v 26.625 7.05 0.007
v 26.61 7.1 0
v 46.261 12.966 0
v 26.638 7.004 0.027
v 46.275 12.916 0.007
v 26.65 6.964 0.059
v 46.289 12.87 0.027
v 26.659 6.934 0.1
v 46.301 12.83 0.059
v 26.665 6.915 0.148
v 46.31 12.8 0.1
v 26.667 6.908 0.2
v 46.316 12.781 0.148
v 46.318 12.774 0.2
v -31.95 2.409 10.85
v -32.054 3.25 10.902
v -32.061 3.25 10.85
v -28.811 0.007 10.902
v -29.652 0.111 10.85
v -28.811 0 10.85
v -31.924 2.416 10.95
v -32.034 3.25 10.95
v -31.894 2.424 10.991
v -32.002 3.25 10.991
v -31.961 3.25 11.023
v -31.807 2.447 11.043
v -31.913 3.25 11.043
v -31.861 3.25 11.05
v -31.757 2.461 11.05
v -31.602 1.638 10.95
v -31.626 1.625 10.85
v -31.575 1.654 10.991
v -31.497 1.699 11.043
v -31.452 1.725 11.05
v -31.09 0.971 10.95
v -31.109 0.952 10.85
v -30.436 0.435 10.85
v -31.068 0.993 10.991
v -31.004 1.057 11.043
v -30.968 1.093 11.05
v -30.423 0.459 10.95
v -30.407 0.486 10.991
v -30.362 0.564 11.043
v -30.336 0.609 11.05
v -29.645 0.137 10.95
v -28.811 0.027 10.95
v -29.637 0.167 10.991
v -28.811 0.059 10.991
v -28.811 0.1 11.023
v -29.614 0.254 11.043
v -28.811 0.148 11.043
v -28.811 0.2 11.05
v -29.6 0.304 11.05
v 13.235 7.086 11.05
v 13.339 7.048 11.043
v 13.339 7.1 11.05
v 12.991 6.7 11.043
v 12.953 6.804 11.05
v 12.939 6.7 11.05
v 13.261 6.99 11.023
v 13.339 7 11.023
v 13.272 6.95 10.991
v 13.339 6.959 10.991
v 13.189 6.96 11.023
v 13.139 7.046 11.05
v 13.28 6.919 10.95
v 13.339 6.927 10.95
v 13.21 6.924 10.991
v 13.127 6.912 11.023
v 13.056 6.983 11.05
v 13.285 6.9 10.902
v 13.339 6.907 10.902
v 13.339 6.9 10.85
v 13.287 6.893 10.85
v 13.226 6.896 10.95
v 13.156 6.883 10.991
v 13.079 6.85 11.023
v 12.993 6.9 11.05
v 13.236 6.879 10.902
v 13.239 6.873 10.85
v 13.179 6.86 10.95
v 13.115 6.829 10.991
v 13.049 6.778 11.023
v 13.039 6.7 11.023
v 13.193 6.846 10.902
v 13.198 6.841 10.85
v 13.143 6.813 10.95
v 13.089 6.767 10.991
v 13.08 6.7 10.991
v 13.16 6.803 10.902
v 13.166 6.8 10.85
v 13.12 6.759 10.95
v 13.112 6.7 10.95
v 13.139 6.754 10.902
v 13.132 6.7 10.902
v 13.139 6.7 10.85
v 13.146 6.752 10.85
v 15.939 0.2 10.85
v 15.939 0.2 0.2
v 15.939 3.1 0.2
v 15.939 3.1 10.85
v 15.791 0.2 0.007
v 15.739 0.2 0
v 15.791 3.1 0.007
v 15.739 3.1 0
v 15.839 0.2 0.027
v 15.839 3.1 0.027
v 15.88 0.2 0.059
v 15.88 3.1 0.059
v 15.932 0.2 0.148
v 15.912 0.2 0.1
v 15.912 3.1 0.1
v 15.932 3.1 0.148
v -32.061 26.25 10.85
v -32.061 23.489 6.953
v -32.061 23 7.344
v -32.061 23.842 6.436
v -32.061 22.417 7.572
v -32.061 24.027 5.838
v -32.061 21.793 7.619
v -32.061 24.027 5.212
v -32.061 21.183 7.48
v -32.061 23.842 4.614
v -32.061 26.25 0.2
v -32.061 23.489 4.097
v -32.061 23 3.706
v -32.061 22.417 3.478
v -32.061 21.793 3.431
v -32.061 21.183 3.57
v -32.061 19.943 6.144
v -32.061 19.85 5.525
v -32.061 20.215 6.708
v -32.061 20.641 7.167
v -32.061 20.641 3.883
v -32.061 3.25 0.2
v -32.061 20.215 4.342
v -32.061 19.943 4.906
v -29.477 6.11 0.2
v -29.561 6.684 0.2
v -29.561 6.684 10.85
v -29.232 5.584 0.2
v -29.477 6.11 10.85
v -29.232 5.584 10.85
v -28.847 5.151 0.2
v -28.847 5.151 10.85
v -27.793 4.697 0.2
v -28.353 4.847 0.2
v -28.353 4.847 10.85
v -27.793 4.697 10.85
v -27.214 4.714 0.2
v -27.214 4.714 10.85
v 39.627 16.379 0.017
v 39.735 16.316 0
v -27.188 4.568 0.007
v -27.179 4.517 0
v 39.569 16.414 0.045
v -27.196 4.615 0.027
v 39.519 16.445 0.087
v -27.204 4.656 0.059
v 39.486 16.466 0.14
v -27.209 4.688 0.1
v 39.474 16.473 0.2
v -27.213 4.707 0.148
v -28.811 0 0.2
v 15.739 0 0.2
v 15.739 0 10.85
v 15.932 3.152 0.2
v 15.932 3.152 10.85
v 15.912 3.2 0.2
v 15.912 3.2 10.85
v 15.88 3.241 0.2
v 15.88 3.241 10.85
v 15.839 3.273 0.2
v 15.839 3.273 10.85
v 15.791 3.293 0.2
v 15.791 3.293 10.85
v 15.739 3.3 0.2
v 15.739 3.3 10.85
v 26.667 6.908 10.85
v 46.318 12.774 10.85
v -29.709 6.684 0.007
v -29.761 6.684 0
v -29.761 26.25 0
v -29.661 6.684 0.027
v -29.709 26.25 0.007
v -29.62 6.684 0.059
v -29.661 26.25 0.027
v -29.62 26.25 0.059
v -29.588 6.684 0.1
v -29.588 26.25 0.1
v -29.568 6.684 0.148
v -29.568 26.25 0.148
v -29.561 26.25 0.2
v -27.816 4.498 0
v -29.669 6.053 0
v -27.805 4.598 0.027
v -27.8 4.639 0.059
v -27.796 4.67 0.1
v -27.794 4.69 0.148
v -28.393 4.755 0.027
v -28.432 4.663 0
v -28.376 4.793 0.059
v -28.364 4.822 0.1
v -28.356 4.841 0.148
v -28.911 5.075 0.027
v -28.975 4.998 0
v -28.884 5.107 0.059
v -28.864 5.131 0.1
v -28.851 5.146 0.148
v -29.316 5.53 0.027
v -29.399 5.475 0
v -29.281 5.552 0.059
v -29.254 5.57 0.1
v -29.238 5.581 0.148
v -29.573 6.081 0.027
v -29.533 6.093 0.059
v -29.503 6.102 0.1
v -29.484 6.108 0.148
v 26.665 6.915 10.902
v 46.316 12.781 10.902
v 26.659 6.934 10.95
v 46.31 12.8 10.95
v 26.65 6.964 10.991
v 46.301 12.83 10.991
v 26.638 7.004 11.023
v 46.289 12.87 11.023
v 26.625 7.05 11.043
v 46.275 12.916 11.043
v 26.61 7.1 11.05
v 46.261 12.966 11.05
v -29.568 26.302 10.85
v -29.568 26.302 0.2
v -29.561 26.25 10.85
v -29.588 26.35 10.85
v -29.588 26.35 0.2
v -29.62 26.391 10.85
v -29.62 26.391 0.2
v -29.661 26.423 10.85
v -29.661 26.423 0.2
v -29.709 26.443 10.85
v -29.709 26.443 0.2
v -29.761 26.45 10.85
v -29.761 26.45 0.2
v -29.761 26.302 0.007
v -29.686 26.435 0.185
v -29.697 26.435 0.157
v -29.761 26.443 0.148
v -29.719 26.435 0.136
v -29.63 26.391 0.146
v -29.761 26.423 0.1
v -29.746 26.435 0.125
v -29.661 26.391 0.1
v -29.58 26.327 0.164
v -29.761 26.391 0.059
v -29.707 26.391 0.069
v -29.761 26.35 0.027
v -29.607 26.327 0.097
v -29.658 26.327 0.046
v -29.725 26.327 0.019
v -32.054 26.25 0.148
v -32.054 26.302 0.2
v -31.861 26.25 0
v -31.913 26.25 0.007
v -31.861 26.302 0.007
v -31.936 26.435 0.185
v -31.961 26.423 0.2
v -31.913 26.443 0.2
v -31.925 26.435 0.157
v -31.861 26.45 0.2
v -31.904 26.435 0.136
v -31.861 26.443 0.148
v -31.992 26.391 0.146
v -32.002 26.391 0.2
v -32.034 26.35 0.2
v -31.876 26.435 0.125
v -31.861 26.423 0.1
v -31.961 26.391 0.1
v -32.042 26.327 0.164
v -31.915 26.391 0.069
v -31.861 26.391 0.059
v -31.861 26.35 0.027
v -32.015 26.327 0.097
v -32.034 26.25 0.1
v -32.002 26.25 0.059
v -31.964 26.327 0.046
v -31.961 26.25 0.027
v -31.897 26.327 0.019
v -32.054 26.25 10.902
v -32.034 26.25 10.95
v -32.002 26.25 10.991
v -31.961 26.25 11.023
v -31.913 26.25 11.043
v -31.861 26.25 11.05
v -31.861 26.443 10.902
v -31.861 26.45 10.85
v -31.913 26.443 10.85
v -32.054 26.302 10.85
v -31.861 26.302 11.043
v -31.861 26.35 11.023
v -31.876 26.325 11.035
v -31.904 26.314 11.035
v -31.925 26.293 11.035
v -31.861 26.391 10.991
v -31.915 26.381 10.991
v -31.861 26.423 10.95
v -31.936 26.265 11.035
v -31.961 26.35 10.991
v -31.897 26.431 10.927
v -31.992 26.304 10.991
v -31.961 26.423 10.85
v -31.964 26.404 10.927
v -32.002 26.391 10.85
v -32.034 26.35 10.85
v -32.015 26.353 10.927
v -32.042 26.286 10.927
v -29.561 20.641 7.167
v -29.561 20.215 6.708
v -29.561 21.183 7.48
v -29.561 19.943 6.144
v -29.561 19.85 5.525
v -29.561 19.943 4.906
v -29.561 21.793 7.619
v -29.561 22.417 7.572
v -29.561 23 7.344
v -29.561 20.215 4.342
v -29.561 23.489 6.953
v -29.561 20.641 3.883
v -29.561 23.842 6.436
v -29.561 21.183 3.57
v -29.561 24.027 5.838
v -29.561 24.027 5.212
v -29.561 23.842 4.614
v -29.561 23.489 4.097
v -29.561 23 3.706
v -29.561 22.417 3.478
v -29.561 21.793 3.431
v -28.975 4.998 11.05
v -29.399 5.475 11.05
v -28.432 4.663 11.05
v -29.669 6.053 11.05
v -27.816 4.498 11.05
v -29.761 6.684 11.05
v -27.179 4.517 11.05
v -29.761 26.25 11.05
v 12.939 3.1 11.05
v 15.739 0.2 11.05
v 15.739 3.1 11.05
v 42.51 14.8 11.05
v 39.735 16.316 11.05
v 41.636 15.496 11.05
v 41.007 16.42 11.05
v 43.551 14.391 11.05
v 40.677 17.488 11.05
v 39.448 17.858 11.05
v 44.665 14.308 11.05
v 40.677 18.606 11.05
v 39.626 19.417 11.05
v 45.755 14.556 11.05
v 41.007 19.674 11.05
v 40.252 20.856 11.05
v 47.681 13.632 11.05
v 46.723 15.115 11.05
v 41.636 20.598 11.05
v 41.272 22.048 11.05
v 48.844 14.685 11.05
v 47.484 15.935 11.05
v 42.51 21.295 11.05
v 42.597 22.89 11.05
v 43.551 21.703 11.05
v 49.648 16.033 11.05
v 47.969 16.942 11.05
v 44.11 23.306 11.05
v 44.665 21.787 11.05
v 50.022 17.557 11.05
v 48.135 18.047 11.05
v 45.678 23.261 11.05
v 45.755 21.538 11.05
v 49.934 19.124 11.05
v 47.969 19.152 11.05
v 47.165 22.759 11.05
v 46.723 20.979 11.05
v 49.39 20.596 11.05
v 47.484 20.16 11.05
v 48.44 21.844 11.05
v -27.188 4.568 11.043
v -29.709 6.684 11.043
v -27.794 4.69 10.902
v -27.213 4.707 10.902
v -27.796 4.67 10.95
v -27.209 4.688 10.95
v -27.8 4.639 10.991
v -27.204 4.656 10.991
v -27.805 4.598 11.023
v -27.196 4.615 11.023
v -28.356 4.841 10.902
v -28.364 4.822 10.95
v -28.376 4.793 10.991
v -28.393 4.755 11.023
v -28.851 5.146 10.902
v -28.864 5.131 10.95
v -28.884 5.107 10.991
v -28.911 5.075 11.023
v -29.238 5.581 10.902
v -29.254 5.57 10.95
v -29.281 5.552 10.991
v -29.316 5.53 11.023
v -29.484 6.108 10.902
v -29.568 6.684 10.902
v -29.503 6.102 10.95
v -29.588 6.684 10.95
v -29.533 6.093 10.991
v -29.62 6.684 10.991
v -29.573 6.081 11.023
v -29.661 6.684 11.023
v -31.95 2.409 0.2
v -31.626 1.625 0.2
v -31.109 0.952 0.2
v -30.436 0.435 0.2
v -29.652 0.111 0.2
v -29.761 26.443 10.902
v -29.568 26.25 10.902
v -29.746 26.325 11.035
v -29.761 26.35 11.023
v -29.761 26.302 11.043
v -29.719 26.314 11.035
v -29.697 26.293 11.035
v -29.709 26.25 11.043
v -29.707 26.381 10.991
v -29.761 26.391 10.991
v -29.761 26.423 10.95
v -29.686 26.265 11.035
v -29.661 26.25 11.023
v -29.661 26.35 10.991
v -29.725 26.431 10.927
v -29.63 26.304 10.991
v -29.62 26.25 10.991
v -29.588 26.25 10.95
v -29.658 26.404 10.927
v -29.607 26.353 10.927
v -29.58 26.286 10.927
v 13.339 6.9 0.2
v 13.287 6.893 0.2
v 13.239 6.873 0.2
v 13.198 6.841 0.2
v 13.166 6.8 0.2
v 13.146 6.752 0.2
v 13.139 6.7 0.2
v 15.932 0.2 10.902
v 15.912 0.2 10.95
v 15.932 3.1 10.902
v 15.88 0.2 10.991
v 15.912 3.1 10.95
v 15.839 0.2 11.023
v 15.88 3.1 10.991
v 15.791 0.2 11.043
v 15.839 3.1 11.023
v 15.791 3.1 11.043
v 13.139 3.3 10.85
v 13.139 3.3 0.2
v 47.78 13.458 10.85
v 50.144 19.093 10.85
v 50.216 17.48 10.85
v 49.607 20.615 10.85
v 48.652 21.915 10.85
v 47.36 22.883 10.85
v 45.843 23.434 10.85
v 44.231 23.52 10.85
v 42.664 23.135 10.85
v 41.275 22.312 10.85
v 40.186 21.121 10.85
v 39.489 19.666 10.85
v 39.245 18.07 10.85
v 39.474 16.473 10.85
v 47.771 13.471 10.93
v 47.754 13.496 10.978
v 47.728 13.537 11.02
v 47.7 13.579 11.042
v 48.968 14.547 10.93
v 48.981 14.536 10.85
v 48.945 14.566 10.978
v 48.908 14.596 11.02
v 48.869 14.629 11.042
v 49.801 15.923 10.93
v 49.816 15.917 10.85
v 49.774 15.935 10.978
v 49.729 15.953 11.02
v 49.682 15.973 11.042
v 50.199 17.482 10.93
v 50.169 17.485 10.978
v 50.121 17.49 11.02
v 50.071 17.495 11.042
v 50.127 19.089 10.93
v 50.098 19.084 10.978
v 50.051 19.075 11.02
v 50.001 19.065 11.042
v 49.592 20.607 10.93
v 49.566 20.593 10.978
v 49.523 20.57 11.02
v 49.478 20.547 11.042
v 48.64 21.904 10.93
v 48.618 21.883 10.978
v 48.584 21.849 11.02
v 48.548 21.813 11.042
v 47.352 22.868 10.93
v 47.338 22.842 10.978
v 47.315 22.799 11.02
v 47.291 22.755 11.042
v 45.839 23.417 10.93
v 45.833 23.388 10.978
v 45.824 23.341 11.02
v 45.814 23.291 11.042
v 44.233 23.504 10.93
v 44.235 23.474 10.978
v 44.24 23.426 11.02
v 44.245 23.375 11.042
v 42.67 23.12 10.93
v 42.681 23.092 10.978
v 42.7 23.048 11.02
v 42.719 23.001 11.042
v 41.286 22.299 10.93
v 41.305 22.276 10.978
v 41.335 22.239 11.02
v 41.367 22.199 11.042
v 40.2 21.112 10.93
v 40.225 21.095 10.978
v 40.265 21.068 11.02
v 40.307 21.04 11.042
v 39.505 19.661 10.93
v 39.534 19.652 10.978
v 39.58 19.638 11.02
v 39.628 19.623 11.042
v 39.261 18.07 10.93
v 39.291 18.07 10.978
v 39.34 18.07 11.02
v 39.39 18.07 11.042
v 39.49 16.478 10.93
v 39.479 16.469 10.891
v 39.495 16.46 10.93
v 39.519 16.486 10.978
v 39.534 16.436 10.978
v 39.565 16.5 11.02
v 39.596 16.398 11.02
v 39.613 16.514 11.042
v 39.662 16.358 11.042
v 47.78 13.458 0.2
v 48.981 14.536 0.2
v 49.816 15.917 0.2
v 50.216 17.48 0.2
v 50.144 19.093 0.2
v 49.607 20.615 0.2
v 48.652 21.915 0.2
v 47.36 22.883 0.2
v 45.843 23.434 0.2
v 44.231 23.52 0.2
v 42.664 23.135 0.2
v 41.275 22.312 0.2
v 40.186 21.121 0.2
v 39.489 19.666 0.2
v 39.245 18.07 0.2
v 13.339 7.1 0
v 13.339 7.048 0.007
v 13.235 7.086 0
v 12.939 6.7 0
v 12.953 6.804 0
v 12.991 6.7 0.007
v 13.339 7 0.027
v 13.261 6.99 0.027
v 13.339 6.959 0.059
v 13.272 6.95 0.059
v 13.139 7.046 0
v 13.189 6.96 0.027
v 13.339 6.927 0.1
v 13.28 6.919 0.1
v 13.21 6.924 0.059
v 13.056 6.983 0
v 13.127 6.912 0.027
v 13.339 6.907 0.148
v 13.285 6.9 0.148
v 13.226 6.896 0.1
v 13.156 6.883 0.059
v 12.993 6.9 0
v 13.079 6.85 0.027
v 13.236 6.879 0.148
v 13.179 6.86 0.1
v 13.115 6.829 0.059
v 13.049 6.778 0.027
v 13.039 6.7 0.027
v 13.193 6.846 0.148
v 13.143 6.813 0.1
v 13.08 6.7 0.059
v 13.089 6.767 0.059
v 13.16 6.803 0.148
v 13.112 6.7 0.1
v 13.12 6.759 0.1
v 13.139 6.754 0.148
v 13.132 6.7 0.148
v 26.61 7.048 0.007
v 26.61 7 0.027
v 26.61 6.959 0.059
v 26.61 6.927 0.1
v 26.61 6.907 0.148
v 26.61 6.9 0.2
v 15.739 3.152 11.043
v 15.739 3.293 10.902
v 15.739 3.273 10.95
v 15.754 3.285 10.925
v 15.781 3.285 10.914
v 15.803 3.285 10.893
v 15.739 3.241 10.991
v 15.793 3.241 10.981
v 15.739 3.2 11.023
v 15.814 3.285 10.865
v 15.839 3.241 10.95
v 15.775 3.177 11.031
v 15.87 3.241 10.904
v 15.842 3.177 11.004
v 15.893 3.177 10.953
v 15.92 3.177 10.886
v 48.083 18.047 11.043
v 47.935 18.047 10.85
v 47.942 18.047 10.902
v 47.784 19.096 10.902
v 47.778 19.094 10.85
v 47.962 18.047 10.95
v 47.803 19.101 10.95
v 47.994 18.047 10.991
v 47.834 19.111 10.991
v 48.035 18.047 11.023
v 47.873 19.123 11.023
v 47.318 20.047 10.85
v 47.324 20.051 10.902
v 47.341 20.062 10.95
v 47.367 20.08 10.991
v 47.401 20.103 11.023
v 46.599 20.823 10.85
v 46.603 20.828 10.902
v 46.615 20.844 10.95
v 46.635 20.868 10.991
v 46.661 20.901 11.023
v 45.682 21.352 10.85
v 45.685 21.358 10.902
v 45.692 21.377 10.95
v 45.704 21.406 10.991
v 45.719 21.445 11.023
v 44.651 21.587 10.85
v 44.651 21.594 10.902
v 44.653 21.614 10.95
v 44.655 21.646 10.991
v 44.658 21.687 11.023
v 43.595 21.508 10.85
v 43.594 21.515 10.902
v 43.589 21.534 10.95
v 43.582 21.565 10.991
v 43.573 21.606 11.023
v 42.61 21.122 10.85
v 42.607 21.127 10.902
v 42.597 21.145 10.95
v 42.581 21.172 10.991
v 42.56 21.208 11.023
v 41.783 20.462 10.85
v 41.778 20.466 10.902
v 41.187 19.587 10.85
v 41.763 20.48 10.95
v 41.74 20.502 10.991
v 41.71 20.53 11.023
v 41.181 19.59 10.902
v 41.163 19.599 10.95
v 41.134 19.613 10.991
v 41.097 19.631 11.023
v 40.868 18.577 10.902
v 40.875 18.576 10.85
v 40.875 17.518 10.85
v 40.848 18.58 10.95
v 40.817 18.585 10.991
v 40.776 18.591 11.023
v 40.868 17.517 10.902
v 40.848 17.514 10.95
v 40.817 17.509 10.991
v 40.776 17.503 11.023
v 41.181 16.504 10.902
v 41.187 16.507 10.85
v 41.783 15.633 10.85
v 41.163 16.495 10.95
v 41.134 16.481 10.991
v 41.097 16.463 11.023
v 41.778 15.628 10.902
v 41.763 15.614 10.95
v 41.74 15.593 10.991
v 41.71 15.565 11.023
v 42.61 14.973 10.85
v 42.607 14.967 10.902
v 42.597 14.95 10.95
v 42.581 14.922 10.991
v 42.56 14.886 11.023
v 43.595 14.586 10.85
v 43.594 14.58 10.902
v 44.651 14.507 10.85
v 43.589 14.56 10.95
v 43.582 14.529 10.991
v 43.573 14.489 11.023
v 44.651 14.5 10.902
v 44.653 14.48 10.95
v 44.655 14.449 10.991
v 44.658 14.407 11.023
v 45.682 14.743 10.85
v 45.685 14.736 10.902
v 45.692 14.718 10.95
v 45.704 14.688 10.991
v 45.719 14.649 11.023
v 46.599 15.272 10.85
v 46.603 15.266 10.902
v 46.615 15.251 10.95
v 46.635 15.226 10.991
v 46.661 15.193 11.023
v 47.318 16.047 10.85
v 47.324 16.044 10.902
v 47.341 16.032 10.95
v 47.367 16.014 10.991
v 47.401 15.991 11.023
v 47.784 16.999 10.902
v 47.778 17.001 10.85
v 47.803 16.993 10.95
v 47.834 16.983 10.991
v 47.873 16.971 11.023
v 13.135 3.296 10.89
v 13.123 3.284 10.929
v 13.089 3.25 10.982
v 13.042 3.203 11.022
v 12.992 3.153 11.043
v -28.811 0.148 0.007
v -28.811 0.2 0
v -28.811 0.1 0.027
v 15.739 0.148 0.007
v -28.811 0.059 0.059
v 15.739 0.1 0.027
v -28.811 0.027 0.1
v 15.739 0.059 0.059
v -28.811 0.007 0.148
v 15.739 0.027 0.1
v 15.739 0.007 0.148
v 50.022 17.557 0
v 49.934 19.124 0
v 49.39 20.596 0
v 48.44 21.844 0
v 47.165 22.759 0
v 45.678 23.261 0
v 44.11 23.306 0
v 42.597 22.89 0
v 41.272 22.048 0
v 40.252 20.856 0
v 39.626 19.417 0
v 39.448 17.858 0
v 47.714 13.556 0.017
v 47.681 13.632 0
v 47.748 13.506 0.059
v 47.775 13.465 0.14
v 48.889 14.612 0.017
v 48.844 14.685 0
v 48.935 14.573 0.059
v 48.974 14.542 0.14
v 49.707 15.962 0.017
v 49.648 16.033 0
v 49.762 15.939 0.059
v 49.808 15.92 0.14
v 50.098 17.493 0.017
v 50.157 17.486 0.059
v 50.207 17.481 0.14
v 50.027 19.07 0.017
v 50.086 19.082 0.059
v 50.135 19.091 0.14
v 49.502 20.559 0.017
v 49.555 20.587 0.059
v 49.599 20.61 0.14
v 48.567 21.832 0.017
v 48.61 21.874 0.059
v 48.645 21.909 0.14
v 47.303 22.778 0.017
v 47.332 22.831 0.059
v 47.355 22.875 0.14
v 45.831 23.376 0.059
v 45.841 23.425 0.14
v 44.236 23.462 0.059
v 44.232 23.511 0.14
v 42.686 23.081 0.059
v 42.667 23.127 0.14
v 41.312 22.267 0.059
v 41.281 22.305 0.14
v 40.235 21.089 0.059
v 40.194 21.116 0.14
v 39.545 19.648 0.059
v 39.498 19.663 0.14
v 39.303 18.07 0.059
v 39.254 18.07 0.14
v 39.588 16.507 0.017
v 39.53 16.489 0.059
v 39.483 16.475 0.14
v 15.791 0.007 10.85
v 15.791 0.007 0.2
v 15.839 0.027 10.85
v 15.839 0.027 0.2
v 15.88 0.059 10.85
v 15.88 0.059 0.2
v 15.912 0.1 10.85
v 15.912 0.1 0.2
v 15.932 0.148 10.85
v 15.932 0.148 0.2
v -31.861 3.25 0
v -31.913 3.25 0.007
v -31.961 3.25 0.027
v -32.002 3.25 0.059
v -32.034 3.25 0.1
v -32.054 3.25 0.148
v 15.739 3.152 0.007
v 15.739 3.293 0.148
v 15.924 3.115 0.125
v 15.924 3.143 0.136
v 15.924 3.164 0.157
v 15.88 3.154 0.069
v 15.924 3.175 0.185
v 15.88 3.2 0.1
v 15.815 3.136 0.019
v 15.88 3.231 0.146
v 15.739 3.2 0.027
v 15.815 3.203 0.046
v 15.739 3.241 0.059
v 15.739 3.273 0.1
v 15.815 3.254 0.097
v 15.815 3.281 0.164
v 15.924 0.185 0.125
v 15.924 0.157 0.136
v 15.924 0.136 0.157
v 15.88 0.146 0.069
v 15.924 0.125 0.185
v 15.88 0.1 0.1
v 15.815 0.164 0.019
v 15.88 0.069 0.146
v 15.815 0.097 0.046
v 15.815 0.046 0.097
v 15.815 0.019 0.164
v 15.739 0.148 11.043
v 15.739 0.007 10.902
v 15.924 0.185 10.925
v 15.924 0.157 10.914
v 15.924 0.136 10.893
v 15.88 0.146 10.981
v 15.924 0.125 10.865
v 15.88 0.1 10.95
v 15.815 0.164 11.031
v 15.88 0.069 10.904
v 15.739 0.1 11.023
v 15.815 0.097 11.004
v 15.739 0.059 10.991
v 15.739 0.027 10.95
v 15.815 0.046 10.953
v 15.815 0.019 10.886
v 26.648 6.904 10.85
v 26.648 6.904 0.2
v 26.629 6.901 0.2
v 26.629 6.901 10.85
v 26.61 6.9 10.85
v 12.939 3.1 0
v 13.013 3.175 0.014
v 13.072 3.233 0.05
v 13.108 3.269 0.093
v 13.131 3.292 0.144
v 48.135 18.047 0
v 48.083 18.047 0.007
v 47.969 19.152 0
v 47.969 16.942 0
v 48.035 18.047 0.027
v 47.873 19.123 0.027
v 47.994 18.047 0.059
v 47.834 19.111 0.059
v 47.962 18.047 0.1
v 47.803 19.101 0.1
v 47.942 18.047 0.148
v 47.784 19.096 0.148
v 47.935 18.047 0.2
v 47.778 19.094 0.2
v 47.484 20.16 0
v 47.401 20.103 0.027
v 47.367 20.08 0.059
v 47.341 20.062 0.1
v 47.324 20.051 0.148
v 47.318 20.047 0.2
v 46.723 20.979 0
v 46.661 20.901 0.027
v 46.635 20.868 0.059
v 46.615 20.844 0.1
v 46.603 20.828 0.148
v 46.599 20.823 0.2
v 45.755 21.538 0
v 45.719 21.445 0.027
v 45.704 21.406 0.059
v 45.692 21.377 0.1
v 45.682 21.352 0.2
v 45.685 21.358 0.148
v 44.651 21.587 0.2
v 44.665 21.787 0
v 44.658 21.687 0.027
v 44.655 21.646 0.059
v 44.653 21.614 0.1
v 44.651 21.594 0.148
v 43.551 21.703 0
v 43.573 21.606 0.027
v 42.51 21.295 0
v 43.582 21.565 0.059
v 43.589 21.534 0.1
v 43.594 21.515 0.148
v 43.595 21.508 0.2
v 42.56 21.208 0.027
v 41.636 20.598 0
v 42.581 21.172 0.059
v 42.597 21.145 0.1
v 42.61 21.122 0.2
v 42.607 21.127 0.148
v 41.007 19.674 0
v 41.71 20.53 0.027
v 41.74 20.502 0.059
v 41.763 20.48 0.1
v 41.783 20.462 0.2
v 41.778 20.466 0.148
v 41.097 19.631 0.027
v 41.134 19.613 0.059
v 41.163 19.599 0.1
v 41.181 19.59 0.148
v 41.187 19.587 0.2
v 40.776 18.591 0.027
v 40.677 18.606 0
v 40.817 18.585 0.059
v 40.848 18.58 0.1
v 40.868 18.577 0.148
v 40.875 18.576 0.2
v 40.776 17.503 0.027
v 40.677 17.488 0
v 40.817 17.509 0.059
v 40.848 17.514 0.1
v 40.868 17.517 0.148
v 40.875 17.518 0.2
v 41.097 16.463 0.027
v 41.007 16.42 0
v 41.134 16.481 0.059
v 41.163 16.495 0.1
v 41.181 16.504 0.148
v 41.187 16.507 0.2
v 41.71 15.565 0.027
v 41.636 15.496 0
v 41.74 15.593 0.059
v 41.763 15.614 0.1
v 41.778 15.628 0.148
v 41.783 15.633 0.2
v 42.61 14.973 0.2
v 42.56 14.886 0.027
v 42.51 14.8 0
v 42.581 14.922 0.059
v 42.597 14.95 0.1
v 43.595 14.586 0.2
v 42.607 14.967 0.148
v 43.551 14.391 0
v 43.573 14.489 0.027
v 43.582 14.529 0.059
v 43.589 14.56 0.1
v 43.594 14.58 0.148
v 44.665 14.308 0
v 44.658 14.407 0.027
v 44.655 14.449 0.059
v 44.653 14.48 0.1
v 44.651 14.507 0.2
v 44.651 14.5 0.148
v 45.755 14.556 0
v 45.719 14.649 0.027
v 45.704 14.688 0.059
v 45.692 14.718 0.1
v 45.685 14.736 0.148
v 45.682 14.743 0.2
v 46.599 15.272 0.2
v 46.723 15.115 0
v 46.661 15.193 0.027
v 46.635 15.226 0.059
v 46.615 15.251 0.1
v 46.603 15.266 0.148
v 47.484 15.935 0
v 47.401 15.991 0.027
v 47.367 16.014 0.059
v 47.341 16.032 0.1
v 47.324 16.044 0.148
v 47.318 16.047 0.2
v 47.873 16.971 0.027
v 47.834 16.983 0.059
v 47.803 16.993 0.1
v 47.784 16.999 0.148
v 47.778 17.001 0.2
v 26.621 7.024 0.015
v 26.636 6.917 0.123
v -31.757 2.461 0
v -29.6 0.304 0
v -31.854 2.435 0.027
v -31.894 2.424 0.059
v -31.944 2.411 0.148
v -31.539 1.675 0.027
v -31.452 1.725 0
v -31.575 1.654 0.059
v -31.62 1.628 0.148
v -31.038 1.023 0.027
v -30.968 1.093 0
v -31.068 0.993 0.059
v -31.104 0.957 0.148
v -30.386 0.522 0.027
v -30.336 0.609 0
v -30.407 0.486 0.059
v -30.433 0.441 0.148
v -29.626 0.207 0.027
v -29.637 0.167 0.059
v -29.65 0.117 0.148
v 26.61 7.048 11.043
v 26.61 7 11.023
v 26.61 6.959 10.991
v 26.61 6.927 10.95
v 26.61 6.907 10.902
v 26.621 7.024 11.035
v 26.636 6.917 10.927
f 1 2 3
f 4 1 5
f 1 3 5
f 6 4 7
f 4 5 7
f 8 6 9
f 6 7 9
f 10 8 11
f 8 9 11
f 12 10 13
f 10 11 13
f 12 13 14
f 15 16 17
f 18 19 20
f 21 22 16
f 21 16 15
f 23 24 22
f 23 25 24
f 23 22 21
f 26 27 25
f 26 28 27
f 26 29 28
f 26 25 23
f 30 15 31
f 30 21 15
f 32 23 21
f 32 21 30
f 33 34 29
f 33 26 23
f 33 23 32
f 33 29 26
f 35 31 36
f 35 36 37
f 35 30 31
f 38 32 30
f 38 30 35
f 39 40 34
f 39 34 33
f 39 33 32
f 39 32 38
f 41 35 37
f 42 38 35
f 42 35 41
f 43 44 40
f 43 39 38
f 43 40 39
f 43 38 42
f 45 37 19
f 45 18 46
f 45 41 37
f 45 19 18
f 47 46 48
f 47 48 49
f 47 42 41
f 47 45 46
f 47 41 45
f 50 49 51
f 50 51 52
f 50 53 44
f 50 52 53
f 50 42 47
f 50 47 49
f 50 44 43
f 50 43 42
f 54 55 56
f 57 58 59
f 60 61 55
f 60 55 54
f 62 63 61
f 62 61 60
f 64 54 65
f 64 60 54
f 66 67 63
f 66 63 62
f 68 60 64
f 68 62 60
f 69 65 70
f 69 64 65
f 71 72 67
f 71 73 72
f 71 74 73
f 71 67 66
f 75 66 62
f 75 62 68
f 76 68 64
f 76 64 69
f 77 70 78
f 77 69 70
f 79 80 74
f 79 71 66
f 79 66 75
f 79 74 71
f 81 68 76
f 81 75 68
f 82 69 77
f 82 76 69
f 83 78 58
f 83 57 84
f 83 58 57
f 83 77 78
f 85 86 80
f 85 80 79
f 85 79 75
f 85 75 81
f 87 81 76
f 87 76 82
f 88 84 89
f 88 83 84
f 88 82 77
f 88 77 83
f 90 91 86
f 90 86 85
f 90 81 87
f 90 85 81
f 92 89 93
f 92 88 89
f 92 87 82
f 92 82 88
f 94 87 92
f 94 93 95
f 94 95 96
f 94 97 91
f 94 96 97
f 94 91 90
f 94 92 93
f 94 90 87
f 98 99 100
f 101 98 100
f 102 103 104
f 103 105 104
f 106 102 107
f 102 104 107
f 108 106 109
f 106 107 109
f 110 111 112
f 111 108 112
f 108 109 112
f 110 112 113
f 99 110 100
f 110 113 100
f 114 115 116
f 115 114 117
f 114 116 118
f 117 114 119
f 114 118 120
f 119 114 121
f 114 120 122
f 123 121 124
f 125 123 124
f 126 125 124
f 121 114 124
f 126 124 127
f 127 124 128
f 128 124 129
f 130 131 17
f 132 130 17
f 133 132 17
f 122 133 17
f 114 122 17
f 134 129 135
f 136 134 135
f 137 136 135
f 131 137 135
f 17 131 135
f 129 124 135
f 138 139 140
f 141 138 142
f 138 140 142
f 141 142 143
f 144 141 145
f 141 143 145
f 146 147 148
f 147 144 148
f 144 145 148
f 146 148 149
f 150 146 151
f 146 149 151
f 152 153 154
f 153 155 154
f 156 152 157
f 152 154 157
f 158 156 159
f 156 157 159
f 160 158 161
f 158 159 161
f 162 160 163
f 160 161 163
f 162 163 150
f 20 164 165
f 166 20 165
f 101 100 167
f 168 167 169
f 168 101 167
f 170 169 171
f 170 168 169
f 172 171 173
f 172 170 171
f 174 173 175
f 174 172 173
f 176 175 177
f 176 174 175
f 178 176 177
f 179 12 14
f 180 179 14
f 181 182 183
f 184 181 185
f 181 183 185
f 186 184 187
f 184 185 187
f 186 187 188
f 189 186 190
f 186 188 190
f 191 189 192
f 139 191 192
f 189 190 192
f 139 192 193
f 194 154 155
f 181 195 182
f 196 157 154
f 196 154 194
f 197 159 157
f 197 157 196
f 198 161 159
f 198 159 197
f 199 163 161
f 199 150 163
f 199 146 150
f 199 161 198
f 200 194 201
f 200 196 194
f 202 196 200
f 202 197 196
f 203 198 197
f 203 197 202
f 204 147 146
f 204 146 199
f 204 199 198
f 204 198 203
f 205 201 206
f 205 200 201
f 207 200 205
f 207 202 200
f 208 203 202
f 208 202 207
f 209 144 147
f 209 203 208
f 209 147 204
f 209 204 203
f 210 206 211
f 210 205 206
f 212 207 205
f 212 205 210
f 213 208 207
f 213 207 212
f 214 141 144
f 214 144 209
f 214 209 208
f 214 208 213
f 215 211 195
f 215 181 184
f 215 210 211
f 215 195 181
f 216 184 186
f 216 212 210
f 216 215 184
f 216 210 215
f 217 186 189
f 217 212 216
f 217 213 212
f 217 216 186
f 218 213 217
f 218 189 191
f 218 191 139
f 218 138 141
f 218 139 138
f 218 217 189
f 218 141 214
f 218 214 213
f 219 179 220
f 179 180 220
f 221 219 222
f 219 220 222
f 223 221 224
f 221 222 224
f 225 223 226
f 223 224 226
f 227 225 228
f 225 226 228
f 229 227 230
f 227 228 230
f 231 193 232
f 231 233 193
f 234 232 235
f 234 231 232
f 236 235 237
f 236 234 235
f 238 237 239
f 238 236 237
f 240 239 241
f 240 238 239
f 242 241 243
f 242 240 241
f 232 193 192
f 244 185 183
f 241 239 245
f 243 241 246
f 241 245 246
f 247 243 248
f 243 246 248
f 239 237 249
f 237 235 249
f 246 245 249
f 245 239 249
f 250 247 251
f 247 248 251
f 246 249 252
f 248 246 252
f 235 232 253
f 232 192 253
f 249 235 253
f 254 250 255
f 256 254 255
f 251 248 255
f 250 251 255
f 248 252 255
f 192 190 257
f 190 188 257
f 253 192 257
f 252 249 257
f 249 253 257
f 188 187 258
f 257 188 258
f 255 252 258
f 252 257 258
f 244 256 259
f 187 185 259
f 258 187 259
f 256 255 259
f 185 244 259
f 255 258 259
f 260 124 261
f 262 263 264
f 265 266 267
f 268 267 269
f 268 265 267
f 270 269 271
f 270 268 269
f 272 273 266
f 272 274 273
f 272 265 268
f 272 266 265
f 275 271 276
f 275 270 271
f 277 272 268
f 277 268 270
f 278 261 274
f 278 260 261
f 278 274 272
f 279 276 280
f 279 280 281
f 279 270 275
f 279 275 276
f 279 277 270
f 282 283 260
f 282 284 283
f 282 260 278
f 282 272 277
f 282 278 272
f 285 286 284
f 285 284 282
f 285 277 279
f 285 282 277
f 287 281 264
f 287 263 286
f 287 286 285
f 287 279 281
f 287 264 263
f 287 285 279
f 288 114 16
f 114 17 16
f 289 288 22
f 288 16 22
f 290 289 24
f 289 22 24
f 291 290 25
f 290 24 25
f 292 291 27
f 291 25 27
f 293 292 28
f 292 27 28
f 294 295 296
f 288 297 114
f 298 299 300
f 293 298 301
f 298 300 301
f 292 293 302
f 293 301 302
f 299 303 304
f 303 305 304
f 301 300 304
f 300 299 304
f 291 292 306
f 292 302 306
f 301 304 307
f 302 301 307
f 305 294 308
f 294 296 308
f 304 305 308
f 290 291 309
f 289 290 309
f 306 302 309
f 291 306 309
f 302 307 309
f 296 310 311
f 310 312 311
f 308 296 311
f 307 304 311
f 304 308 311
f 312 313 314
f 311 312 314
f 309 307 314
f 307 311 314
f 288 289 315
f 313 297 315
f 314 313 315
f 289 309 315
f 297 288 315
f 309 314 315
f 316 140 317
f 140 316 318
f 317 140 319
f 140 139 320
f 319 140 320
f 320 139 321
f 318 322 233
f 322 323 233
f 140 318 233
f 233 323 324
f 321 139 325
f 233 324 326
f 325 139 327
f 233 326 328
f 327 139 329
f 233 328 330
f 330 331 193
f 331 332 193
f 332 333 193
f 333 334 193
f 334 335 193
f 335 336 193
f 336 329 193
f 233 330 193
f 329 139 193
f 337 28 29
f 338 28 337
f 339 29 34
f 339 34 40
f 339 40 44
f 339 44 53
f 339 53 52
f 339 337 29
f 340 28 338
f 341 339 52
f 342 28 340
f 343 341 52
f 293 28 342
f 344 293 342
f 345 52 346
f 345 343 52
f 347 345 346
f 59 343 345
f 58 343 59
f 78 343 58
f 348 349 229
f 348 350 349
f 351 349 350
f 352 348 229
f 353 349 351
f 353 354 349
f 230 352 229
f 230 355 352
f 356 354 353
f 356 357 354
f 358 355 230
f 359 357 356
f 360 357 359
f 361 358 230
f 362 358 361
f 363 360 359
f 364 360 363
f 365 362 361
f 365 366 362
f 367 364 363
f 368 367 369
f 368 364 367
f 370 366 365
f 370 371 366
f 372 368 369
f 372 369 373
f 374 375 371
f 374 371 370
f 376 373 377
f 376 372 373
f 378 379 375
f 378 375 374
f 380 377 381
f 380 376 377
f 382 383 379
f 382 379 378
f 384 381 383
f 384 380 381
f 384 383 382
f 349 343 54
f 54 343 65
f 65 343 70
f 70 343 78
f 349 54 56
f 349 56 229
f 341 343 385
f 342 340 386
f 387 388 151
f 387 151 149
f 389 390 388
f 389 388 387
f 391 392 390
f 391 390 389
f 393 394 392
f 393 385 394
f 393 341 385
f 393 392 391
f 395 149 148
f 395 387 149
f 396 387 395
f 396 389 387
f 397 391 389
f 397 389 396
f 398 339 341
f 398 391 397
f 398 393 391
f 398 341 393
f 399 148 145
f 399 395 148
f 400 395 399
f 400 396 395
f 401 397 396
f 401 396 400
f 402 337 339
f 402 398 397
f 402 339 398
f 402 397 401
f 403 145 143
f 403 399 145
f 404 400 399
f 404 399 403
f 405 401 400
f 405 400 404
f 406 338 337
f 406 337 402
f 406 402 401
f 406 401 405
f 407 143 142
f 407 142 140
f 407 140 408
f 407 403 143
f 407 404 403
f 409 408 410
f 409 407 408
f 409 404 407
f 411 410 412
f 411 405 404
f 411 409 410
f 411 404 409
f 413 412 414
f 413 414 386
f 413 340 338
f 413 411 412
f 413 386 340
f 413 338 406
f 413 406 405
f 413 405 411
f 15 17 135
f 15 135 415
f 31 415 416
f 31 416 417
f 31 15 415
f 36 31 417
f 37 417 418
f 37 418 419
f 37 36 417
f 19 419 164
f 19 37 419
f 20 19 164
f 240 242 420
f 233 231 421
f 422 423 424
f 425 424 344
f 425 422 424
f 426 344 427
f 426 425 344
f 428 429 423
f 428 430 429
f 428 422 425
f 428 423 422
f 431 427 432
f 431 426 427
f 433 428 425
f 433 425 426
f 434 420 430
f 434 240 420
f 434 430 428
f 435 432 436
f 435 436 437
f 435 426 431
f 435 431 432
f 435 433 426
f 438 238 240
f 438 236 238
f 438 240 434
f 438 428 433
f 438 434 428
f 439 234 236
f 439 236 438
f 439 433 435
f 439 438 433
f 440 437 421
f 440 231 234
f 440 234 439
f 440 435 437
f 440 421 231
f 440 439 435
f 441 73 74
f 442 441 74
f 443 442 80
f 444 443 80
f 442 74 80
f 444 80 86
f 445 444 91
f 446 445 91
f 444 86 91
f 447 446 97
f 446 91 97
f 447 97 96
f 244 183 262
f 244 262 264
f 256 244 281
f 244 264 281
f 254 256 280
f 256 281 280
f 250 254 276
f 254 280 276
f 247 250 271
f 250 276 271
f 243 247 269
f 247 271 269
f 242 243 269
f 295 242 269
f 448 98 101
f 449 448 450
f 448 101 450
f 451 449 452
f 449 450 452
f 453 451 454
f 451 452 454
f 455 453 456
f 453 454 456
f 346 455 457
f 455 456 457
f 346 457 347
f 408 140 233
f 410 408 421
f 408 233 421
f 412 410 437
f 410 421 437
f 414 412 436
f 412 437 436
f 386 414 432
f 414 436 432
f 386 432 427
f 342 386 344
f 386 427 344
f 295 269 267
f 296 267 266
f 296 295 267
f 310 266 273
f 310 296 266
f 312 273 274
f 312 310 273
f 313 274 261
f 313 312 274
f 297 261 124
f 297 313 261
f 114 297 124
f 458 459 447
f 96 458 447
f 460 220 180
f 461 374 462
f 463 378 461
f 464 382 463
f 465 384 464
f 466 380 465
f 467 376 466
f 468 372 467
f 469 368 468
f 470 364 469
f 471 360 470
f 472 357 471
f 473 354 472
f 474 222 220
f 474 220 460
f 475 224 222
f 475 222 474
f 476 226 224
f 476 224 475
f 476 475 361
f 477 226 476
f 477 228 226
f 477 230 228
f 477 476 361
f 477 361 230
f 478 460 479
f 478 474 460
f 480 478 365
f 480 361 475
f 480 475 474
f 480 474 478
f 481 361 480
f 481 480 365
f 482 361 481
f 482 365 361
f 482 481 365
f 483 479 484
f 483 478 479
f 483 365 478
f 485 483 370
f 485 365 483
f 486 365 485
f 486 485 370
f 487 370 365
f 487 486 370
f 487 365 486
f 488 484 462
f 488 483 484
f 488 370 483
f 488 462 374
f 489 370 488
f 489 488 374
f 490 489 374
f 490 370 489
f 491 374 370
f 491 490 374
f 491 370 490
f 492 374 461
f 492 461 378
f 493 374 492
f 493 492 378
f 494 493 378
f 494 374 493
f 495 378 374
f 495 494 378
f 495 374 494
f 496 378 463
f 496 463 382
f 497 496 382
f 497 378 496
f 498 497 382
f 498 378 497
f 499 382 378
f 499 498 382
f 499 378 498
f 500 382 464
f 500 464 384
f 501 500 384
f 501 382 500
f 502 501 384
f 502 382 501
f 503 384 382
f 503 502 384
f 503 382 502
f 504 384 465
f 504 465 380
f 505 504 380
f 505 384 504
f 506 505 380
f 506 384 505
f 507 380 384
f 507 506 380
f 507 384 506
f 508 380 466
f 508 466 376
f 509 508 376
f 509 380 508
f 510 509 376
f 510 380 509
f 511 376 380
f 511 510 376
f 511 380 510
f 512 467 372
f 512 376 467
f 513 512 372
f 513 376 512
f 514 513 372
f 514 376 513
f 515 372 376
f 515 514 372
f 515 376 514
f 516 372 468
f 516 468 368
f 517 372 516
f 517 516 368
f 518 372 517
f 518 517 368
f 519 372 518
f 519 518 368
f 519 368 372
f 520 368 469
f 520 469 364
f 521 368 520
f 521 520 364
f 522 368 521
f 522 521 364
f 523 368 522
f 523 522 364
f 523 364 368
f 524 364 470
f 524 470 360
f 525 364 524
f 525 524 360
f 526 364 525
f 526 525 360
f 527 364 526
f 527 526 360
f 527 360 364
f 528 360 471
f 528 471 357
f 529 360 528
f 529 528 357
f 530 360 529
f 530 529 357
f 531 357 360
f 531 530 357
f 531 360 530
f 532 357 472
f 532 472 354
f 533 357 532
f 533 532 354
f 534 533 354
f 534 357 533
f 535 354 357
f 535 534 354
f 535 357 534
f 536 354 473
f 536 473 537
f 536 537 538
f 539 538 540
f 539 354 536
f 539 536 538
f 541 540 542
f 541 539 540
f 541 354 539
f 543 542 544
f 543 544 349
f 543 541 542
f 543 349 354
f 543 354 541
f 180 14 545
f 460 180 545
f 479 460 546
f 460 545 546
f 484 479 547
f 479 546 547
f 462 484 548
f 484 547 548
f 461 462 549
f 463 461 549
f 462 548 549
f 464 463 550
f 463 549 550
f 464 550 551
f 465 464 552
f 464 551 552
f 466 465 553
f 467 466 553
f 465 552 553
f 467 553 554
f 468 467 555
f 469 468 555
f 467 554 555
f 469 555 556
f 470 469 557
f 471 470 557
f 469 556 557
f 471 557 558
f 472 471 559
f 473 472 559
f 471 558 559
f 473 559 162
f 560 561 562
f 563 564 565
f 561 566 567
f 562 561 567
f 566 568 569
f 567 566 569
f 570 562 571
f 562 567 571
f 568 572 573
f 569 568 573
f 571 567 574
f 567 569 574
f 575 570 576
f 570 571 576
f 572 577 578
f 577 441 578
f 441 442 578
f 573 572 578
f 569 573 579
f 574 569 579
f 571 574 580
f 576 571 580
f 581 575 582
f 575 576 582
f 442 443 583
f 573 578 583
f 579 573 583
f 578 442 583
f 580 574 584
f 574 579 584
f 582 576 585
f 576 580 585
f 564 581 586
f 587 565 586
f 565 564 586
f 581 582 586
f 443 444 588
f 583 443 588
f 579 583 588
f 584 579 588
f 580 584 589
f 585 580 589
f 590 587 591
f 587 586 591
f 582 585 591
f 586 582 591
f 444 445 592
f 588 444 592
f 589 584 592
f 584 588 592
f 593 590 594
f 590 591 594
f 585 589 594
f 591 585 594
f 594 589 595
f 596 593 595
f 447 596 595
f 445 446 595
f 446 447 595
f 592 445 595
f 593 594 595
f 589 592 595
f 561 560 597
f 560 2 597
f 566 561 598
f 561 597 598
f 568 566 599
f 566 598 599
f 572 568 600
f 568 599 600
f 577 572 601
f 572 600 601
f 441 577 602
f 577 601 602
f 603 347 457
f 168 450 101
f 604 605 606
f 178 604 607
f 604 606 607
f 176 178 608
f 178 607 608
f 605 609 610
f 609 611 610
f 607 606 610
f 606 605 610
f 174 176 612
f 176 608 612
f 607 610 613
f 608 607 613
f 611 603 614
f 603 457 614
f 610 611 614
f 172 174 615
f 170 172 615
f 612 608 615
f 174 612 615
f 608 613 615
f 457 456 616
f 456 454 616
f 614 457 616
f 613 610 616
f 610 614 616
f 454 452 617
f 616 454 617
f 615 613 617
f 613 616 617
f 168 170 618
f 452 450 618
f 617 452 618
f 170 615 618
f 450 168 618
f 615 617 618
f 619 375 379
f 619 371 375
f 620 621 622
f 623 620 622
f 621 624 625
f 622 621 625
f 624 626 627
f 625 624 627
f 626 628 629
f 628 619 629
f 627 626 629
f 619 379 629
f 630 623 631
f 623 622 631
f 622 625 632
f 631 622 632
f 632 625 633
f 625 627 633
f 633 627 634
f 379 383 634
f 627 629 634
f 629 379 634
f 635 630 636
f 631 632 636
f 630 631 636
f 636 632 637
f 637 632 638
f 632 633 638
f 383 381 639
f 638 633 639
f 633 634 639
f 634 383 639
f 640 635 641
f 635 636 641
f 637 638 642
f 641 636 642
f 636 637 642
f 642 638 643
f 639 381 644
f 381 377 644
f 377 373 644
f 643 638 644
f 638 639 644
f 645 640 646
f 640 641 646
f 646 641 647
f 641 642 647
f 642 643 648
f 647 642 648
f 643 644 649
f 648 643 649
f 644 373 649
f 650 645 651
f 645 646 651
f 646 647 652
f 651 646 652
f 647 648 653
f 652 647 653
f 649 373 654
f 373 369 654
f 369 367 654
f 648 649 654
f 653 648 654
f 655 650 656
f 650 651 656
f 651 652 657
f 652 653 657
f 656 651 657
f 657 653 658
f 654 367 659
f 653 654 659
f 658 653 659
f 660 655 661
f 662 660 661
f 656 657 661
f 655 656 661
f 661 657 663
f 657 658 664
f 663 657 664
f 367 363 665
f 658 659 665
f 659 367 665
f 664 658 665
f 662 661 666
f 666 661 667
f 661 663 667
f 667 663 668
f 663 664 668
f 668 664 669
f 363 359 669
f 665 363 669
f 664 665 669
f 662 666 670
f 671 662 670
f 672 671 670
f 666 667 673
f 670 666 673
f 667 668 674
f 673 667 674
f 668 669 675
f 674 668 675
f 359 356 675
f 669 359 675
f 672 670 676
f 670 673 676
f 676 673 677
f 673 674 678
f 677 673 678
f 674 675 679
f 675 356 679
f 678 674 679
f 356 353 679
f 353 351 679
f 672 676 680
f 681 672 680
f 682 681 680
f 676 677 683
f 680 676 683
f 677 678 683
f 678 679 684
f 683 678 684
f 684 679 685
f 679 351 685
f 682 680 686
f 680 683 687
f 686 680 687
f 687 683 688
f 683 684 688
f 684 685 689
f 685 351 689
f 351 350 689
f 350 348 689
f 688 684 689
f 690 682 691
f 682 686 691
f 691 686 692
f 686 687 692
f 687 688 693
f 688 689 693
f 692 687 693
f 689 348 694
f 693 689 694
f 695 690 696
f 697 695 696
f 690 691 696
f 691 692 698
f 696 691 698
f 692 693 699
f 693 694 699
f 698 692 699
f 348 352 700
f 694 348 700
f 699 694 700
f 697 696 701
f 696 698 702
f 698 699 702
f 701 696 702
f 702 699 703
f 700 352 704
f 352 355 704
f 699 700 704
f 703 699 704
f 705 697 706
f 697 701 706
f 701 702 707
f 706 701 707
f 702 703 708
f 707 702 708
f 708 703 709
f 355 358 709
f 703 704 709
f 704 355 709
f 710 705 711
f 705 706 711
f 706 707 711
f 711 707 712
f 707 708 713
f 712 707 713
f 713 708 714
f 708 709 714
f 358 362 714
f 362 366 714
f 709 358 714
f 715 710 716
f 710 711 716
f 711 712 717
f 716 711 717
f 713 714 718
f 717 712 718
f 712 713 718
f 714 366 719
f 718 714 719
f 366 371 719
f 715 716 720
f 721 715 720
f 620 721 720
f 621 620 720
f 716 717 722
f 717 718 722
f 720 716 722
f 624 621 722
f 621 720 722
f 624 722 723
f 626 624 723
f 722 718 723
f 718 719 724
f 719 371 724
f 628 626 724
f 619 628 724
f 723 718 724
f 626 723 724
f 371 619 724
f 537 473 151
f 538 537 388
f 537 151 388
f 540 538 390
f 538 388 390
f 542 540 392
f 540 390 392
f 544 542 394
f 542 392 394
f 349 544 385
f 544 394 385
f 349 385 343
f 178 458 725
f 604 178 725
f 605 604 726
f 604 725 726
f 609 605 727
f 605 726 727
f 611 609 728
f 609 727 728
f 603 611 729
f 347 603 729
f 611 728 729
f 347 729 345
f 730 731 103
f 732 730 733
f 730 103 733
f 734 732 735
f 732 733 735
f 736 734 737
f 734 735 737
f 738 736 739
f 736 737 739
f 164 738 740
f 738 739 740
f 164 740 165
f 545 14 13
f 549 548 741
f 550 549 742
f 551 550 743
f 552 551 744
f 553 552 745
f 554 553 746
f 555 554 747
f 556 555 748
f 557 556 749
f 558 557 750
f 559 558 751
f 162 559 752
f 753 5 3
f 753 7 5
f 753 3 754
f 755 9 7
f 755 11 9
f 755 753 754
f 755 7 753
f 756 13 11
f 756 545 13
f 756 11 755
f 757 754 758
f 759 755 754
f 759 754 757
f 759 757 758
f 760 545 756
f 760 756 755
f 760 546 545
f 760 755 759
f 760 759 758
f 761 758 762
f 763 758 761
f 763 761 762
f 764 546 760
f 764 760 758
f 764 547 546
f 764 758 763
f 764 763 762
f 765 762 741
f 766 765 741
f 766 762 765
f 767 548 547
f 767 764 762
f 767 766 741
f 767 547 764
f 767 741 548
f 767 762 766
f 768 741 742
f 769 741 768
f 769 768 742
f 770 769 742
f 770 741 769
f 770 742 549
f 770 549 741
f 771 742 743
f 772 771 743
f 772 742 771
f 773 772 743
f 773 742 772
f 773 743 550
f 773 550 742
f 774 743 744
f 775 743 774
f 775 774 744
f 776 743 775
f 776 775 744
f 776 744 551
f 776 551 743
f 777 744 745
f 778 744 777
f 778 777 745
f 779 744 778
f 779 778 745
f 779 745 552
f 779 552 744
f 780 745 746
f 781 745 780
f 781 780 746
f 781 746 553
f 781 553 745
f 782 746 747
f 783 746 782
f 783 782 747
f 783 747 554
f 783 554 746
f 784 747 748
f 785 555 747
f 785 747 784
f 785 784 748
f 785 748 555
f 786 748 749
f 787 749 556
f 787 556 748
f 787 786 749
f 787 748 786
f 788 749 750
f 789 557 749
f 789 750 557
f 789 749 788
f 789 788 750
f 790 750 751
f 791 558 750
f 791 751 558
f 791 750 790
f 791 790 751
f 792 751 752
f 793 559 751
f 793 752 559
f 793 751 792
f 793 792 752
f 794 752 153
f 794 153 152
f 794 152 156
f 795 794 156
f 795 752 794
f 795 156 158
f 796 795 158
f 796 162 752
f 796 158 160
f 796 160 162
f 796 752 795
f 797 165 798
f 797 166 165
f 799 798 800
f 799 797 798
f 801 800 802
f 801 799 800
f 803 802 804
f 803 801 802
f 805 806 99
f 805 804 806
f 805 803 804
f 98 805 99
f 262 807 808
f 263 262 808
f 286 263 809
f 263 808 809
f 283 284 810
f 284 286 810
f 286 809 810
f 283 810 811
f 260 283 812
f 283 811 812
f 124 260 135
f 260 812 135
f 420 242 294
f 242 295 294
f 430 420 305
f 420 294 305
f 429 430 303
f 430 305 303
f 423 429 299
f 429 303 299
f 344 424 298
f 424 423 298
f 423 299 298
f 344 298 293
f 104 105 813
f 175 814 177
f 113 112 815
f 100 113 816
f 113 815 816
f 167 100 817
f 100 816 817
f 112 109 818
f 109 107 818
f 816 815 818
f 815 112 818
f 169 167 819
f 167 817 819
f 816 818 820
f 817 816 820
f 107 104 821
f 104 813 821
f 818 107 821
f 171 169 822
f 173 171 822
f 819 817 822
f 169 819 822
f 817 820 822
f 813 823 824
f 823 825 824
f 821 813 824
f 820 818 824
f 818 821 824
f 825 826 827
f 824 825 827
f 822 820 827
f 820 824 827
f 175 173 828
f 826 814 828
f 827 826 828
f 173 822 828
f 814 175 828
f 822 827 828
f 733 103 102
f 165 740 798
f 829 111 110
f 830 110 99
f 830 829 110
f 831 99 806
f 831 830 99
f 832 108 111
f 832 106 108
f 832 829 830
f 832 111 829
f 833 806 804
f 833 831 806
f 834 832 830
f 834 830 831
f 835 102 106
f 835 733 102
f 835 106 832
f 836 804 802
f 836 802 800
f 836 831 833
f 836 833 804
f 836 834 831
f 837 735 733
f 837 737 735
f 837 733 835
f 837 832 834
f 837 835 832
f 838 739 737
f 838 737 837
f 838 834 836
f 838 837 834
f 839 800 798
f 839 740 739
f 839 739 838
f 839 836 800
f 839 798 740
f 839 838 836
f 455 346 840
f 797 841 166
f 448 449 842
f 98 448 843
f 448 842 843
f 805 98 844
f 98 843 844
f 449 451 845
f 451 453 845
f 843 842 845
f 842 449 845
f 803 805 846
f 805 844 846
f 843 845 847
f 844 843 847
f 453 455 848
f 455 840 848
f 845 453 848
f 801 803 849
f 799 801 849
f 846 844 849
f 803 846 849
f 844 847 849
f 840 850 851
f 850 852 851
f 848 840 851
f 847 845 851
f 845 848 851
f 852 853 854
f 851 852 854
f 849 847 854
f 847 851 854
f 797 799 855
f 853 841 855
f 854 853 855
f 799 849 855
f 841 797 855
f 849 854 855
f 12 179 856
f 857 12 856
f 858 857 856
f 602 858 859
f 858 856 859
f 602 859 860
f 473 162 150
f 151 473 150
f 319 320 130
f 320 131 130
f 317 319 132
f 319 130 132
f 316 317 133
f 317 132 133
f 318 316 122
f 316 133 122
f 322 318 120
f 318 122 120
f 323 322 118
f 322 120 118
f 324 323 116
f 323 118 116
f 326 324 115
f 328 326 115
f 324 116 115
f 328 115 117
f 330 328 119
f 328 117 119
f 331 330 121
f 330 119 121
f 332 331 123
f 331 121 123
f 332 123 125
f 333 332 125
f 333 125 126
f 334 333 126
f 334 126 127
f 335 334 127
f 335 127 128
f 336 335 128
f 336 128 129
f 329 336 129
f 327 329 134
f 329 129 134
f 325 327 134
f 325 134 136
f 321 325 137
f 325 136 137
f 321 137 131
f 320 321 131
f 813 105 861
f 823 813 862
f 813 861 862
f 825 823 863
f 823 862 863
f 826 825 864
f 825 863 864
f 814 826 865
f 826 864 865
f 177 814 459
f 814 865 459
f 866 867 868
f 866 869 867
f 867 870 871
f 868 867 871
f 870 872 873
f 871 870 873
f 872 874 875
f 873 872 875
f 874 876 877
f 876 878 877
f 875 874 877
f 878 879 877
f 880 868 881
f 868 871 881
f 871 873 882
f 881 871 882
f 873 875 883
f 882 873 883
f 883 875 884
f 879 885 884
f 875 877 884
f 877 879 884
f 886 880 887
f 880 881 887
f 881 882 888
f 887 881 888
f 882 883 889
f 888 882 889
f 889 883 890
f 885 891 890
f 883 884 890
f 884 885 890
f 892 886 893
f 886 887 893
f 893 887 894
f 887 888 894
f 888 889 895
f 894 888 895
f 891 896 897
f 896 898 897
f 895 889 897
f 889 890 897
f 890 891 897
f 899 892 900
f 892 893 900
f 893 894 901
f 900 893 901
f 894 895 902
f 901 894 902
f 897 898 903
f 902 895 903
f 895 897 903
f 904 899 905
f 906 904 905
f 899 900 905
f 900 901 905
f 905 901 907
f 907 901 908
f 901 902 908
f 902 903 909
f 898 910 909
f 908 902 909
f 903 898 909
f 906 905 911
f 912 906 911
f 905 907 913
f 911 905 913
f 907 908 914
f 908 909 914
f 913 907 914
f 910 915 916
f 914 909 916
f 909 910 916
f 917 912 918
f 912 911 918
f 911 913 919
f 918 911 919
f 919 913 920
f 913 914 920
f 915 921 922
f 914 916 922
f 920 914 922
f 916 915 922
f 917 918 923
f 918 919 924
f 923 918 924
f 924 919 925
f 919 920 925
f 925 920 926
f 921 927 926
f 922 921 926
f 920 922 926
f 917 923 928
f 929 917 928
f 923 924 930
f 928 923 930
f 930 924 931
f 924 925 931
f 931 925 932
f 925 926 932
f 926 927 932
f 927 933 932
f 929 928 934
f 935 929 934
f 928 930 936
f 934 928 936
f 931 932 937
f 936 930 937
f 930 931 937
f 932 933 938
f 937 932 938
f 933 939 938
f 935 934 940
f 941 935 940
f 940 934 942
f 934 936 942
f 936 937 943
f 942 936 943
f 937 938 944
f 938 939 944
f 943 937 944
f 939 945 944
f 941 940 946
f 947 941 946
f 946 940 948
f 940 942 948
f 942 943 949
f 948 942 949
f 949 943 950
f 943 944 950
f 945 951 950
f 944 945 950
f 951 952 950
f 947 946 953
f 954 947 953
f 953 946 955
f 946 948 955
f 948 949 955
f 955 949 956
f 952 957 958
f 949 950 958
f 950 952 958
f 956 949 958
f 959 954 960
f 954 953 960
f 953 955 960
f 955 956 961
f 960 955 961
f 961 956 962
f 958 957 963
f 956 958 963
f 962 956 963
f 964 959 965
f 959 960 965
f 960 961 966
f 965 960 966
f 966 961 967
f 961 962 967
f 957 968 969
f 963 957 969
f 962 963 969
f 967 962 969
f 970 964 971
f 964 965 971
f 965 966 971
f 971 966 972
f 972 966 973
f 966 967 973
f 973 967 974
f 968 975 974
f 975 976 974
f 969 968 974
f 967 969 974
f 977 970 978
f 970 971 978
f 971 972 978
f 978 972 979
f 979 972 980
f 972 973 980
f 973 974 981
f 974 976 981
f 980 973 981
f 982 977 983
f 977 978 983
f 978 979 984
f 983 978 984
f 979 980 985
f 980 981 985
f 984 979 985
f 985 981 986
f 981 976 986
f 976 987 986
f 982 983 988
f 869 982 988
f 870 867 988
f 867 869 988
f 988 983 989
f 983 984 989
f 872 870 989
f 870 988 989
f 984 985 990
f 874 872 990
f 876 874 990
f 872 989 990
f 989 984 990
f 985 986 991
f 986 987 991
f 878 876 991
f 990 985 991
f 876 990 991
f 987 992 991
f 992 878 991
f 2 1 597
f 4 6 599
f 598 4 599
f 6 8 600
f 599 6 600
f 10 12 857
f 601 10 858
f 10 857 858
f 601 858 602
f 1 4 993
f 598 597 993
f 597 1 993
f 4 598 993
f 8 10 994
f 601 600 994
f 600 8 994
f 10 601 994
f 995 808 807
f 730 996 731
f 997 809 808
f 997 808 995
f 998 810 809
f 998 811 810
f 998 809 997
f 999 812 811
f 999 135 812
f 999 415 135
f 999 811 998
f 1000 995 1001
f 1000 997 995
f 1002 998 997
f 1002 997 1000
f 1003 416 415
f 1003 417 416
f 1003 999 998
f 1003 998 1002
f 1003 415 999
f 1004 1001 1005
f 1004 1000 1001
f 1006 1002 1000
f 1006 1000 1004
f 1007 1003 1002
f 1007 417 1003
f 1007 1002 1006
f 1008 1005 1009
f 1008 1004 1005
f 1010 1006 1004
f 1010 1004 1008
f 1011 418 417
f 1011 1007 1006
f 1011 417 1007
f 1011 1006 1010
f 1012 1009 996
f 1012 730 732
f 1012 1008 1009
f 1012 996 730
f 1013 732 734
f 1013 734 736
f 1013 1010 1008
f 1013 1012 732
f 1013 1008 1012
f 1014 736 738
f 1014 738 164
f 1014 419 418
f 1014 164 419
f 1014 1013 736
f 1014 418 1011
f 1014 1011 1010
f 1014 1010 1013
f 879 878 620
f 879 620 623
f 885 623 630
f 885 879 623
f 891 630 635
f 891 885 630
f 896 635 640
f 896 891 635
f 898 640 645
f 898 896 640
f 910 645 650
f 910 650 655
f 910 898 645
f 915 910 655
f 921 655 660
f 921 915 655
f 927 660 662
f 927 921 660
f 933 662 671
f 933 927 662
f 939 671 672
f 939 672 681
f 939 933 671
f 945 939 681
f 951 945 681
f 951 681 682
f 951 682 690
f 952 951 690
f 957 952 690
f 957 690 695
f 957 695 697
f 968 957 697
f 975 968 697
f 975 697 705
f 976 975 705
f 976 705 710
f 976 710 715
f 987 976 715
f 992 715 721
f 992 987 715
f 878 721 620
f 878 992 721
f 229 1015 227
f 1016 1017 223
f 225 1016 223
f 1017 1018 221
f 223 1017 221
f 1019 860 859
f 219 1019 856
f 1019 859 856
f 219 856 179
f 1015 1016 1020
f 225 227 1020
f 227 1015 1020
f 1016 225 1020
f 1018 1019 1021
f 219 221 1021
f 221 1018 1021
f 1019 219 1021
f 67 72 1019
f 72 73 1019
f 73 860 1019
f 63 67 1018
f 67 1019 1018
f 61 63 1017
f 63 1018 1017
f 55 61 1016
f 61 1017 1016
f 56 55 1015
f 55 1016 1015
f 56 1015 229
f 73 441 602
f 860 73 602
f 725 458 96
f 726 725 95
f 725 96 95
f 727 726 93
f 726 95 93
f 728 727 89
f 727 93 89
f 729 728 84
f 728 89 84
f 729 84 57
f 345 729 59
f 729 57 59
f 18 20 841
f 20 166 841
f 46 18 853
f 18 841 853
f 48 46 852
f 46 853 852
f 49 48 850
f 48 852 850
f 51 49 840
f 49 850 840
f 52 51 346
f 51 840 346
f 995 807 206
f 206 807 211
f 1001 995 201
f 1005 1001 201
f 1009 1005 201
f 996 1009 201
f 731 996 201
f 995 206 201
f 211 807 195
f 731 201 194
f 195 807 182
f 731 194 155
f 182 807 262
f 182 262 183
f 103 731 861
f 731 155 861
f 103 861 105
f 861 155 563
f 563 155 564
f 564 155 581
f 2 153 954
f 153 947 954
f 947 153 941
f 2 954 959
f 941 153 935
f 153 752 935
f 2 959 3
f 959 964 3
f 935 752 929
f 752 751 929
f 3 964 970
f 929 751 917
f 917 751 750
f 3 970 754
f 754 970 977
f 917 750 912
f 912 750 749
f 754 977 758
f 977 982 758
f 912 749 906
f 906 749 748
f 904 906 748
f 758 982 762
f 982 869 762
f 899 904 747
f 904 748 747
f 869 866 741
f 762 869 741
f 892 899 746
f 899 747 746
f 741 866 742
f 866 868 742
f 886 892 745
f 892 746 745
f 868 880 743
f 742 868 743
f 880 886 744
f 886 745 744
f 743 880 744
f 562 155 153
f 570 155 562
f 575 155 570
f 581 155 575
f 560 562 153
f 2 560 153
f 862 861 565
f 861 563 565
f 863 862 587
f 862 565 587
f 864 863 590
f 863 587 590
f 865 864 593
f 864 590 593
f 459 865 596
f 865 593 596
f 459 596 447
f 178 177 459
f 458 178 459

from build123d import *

# Parameters (mm, degrees)
F0_R     = 3.55
F1_DEPTH = 11.05
F2_R     = 3.25
F3_R     = 2
F4_R     = 0.2
F5_R     = 2.1
F6_DEPTH = 12.5


with BuildPart() as f1:
    # F0 (on Top) → F1 (new body)
    with BuildSketch(Plane.XY):
        with BuildLine():
            Line((-29.5610473286, 26.45), (-32.0610473286, 26.45))
            Line((-32.0610473286, 26.45), (-32.0610473286, 0))
            Line((-32.0610473286, 0), (-29.5610473286, 0))
            Line((-29.5610473286, 0), (15.9389526714, 0))
            Line((15.9389526714, 0), (15.9389526714, 3.3))
            Line((15.9389526714, 3.3), (13.1389526714, 3.3))
            Line((13.1389526714, 3.3), (13.1389526714, 6.9))
            Line((13.1389526714, 6.9), (26.6389526714, 6.9))
            Line((26.6389526714, 6.9), (46.3178146432, 12.7740040214))
            ThreePointArc((46.3178146432, 12.7740040214), (47.3596829779, 22.8828041492), (39.4739761576, 16.4727372545))
            Line((39.4739761576, 16.4727372545), (-29.5610473286, 4.3))
            Line((-29.5610473286, 4.3), (-29.5610473286, 26.45))
        make_face()
        with Locations((44.3852424027, 18.0471445908)):
            Circle(F0_R, mode=Mode.SUBTRACT)
    extrude(amount=F1_DEPTH)

    # F2
    f2_edges = [f1.edges().sort_by_distance(p)[0] for p in [
        (-32.061047, 0, 5.525),
    ]]
    fillet(f2_edges, radius=F2_R)

    # F3
    f3_edges = [f1.edges().sort_by_distance(p)[0] for p in [
        (-29.561047, 4.3, 5.525),
    ]]
    fillet(f3_edges, radius=F3_R)

    # F4
    f4_edges = [f1.edges().sort_by_distance(p)[0] for p in [
        (6.130113, 10.593314, 0),
        (47.359683, 22.882804, 0),
        (36.478384, 9.837002, 0),
        (19.888953, 6.9, 0),
        (13.138953, 5.1, 0),
        (14.538953, 3.3, 0),
        (-6.436047, 0, 0),
        (15.938953, 1.65, 0),
        (-31.109144, 0.951903, 0),
        (-28.846623, 5.151418, 0),
        (-29.561047, 16.566754, 0),
        (-32.061047, 14.85, 0),
        (-32.061047, 26.45, 5.525),
        (-29.561047, 26.45, 5.525),
        (-30.811047, 26.45, 11.05),
        (-32.061047, 14.85, 11.05),
        (-29.561047, 16.566754, 11.05),
        (-31.109144, 0.951903, 11.05),
        (-28.846623, 5.151418, 11.05),
        (-6.436047, 0, 11.05),
        (6.130113, 10.593314, 11.05),
        (15.938953, 1.65, 11.05),
        (19.888953, 6.9, 11.05),
        (36.478384, 9.837002, 11.05),
        (47.359683, 22.882804, 11.05),
        (14.538953, 3.3, 11.05),
        (15.938953, 3.3, 5.525),
        (13.138953, 5.1, 11.05),
        (13.138953, 6.9, 5.525),
        (15.938953, 0, 5.525),
        (26.638953, 6.9, 5.525),
        (40.835242, 18.047145, 11.05),
        (40.835242, 18.047145, 0),
        (-30.811047, 26.45, 0),
    ]]
    fillet(f4_edges, radius=F4_R)

    # F5 (on face) → F6 (cut, symmetric)
    with BuildSketch(Plane(origin=(-32.0610473286, 0, 0), x_dir=(0, -1, 0), z_dir=(-1, 0, 0))):
        with Locations((-21.95, 5.525)):
            Circle(F5_R)
    extrude(amount=F6_DEPTH, both=True, mode=Mode.SUBTRACT)


solid = f1.part
